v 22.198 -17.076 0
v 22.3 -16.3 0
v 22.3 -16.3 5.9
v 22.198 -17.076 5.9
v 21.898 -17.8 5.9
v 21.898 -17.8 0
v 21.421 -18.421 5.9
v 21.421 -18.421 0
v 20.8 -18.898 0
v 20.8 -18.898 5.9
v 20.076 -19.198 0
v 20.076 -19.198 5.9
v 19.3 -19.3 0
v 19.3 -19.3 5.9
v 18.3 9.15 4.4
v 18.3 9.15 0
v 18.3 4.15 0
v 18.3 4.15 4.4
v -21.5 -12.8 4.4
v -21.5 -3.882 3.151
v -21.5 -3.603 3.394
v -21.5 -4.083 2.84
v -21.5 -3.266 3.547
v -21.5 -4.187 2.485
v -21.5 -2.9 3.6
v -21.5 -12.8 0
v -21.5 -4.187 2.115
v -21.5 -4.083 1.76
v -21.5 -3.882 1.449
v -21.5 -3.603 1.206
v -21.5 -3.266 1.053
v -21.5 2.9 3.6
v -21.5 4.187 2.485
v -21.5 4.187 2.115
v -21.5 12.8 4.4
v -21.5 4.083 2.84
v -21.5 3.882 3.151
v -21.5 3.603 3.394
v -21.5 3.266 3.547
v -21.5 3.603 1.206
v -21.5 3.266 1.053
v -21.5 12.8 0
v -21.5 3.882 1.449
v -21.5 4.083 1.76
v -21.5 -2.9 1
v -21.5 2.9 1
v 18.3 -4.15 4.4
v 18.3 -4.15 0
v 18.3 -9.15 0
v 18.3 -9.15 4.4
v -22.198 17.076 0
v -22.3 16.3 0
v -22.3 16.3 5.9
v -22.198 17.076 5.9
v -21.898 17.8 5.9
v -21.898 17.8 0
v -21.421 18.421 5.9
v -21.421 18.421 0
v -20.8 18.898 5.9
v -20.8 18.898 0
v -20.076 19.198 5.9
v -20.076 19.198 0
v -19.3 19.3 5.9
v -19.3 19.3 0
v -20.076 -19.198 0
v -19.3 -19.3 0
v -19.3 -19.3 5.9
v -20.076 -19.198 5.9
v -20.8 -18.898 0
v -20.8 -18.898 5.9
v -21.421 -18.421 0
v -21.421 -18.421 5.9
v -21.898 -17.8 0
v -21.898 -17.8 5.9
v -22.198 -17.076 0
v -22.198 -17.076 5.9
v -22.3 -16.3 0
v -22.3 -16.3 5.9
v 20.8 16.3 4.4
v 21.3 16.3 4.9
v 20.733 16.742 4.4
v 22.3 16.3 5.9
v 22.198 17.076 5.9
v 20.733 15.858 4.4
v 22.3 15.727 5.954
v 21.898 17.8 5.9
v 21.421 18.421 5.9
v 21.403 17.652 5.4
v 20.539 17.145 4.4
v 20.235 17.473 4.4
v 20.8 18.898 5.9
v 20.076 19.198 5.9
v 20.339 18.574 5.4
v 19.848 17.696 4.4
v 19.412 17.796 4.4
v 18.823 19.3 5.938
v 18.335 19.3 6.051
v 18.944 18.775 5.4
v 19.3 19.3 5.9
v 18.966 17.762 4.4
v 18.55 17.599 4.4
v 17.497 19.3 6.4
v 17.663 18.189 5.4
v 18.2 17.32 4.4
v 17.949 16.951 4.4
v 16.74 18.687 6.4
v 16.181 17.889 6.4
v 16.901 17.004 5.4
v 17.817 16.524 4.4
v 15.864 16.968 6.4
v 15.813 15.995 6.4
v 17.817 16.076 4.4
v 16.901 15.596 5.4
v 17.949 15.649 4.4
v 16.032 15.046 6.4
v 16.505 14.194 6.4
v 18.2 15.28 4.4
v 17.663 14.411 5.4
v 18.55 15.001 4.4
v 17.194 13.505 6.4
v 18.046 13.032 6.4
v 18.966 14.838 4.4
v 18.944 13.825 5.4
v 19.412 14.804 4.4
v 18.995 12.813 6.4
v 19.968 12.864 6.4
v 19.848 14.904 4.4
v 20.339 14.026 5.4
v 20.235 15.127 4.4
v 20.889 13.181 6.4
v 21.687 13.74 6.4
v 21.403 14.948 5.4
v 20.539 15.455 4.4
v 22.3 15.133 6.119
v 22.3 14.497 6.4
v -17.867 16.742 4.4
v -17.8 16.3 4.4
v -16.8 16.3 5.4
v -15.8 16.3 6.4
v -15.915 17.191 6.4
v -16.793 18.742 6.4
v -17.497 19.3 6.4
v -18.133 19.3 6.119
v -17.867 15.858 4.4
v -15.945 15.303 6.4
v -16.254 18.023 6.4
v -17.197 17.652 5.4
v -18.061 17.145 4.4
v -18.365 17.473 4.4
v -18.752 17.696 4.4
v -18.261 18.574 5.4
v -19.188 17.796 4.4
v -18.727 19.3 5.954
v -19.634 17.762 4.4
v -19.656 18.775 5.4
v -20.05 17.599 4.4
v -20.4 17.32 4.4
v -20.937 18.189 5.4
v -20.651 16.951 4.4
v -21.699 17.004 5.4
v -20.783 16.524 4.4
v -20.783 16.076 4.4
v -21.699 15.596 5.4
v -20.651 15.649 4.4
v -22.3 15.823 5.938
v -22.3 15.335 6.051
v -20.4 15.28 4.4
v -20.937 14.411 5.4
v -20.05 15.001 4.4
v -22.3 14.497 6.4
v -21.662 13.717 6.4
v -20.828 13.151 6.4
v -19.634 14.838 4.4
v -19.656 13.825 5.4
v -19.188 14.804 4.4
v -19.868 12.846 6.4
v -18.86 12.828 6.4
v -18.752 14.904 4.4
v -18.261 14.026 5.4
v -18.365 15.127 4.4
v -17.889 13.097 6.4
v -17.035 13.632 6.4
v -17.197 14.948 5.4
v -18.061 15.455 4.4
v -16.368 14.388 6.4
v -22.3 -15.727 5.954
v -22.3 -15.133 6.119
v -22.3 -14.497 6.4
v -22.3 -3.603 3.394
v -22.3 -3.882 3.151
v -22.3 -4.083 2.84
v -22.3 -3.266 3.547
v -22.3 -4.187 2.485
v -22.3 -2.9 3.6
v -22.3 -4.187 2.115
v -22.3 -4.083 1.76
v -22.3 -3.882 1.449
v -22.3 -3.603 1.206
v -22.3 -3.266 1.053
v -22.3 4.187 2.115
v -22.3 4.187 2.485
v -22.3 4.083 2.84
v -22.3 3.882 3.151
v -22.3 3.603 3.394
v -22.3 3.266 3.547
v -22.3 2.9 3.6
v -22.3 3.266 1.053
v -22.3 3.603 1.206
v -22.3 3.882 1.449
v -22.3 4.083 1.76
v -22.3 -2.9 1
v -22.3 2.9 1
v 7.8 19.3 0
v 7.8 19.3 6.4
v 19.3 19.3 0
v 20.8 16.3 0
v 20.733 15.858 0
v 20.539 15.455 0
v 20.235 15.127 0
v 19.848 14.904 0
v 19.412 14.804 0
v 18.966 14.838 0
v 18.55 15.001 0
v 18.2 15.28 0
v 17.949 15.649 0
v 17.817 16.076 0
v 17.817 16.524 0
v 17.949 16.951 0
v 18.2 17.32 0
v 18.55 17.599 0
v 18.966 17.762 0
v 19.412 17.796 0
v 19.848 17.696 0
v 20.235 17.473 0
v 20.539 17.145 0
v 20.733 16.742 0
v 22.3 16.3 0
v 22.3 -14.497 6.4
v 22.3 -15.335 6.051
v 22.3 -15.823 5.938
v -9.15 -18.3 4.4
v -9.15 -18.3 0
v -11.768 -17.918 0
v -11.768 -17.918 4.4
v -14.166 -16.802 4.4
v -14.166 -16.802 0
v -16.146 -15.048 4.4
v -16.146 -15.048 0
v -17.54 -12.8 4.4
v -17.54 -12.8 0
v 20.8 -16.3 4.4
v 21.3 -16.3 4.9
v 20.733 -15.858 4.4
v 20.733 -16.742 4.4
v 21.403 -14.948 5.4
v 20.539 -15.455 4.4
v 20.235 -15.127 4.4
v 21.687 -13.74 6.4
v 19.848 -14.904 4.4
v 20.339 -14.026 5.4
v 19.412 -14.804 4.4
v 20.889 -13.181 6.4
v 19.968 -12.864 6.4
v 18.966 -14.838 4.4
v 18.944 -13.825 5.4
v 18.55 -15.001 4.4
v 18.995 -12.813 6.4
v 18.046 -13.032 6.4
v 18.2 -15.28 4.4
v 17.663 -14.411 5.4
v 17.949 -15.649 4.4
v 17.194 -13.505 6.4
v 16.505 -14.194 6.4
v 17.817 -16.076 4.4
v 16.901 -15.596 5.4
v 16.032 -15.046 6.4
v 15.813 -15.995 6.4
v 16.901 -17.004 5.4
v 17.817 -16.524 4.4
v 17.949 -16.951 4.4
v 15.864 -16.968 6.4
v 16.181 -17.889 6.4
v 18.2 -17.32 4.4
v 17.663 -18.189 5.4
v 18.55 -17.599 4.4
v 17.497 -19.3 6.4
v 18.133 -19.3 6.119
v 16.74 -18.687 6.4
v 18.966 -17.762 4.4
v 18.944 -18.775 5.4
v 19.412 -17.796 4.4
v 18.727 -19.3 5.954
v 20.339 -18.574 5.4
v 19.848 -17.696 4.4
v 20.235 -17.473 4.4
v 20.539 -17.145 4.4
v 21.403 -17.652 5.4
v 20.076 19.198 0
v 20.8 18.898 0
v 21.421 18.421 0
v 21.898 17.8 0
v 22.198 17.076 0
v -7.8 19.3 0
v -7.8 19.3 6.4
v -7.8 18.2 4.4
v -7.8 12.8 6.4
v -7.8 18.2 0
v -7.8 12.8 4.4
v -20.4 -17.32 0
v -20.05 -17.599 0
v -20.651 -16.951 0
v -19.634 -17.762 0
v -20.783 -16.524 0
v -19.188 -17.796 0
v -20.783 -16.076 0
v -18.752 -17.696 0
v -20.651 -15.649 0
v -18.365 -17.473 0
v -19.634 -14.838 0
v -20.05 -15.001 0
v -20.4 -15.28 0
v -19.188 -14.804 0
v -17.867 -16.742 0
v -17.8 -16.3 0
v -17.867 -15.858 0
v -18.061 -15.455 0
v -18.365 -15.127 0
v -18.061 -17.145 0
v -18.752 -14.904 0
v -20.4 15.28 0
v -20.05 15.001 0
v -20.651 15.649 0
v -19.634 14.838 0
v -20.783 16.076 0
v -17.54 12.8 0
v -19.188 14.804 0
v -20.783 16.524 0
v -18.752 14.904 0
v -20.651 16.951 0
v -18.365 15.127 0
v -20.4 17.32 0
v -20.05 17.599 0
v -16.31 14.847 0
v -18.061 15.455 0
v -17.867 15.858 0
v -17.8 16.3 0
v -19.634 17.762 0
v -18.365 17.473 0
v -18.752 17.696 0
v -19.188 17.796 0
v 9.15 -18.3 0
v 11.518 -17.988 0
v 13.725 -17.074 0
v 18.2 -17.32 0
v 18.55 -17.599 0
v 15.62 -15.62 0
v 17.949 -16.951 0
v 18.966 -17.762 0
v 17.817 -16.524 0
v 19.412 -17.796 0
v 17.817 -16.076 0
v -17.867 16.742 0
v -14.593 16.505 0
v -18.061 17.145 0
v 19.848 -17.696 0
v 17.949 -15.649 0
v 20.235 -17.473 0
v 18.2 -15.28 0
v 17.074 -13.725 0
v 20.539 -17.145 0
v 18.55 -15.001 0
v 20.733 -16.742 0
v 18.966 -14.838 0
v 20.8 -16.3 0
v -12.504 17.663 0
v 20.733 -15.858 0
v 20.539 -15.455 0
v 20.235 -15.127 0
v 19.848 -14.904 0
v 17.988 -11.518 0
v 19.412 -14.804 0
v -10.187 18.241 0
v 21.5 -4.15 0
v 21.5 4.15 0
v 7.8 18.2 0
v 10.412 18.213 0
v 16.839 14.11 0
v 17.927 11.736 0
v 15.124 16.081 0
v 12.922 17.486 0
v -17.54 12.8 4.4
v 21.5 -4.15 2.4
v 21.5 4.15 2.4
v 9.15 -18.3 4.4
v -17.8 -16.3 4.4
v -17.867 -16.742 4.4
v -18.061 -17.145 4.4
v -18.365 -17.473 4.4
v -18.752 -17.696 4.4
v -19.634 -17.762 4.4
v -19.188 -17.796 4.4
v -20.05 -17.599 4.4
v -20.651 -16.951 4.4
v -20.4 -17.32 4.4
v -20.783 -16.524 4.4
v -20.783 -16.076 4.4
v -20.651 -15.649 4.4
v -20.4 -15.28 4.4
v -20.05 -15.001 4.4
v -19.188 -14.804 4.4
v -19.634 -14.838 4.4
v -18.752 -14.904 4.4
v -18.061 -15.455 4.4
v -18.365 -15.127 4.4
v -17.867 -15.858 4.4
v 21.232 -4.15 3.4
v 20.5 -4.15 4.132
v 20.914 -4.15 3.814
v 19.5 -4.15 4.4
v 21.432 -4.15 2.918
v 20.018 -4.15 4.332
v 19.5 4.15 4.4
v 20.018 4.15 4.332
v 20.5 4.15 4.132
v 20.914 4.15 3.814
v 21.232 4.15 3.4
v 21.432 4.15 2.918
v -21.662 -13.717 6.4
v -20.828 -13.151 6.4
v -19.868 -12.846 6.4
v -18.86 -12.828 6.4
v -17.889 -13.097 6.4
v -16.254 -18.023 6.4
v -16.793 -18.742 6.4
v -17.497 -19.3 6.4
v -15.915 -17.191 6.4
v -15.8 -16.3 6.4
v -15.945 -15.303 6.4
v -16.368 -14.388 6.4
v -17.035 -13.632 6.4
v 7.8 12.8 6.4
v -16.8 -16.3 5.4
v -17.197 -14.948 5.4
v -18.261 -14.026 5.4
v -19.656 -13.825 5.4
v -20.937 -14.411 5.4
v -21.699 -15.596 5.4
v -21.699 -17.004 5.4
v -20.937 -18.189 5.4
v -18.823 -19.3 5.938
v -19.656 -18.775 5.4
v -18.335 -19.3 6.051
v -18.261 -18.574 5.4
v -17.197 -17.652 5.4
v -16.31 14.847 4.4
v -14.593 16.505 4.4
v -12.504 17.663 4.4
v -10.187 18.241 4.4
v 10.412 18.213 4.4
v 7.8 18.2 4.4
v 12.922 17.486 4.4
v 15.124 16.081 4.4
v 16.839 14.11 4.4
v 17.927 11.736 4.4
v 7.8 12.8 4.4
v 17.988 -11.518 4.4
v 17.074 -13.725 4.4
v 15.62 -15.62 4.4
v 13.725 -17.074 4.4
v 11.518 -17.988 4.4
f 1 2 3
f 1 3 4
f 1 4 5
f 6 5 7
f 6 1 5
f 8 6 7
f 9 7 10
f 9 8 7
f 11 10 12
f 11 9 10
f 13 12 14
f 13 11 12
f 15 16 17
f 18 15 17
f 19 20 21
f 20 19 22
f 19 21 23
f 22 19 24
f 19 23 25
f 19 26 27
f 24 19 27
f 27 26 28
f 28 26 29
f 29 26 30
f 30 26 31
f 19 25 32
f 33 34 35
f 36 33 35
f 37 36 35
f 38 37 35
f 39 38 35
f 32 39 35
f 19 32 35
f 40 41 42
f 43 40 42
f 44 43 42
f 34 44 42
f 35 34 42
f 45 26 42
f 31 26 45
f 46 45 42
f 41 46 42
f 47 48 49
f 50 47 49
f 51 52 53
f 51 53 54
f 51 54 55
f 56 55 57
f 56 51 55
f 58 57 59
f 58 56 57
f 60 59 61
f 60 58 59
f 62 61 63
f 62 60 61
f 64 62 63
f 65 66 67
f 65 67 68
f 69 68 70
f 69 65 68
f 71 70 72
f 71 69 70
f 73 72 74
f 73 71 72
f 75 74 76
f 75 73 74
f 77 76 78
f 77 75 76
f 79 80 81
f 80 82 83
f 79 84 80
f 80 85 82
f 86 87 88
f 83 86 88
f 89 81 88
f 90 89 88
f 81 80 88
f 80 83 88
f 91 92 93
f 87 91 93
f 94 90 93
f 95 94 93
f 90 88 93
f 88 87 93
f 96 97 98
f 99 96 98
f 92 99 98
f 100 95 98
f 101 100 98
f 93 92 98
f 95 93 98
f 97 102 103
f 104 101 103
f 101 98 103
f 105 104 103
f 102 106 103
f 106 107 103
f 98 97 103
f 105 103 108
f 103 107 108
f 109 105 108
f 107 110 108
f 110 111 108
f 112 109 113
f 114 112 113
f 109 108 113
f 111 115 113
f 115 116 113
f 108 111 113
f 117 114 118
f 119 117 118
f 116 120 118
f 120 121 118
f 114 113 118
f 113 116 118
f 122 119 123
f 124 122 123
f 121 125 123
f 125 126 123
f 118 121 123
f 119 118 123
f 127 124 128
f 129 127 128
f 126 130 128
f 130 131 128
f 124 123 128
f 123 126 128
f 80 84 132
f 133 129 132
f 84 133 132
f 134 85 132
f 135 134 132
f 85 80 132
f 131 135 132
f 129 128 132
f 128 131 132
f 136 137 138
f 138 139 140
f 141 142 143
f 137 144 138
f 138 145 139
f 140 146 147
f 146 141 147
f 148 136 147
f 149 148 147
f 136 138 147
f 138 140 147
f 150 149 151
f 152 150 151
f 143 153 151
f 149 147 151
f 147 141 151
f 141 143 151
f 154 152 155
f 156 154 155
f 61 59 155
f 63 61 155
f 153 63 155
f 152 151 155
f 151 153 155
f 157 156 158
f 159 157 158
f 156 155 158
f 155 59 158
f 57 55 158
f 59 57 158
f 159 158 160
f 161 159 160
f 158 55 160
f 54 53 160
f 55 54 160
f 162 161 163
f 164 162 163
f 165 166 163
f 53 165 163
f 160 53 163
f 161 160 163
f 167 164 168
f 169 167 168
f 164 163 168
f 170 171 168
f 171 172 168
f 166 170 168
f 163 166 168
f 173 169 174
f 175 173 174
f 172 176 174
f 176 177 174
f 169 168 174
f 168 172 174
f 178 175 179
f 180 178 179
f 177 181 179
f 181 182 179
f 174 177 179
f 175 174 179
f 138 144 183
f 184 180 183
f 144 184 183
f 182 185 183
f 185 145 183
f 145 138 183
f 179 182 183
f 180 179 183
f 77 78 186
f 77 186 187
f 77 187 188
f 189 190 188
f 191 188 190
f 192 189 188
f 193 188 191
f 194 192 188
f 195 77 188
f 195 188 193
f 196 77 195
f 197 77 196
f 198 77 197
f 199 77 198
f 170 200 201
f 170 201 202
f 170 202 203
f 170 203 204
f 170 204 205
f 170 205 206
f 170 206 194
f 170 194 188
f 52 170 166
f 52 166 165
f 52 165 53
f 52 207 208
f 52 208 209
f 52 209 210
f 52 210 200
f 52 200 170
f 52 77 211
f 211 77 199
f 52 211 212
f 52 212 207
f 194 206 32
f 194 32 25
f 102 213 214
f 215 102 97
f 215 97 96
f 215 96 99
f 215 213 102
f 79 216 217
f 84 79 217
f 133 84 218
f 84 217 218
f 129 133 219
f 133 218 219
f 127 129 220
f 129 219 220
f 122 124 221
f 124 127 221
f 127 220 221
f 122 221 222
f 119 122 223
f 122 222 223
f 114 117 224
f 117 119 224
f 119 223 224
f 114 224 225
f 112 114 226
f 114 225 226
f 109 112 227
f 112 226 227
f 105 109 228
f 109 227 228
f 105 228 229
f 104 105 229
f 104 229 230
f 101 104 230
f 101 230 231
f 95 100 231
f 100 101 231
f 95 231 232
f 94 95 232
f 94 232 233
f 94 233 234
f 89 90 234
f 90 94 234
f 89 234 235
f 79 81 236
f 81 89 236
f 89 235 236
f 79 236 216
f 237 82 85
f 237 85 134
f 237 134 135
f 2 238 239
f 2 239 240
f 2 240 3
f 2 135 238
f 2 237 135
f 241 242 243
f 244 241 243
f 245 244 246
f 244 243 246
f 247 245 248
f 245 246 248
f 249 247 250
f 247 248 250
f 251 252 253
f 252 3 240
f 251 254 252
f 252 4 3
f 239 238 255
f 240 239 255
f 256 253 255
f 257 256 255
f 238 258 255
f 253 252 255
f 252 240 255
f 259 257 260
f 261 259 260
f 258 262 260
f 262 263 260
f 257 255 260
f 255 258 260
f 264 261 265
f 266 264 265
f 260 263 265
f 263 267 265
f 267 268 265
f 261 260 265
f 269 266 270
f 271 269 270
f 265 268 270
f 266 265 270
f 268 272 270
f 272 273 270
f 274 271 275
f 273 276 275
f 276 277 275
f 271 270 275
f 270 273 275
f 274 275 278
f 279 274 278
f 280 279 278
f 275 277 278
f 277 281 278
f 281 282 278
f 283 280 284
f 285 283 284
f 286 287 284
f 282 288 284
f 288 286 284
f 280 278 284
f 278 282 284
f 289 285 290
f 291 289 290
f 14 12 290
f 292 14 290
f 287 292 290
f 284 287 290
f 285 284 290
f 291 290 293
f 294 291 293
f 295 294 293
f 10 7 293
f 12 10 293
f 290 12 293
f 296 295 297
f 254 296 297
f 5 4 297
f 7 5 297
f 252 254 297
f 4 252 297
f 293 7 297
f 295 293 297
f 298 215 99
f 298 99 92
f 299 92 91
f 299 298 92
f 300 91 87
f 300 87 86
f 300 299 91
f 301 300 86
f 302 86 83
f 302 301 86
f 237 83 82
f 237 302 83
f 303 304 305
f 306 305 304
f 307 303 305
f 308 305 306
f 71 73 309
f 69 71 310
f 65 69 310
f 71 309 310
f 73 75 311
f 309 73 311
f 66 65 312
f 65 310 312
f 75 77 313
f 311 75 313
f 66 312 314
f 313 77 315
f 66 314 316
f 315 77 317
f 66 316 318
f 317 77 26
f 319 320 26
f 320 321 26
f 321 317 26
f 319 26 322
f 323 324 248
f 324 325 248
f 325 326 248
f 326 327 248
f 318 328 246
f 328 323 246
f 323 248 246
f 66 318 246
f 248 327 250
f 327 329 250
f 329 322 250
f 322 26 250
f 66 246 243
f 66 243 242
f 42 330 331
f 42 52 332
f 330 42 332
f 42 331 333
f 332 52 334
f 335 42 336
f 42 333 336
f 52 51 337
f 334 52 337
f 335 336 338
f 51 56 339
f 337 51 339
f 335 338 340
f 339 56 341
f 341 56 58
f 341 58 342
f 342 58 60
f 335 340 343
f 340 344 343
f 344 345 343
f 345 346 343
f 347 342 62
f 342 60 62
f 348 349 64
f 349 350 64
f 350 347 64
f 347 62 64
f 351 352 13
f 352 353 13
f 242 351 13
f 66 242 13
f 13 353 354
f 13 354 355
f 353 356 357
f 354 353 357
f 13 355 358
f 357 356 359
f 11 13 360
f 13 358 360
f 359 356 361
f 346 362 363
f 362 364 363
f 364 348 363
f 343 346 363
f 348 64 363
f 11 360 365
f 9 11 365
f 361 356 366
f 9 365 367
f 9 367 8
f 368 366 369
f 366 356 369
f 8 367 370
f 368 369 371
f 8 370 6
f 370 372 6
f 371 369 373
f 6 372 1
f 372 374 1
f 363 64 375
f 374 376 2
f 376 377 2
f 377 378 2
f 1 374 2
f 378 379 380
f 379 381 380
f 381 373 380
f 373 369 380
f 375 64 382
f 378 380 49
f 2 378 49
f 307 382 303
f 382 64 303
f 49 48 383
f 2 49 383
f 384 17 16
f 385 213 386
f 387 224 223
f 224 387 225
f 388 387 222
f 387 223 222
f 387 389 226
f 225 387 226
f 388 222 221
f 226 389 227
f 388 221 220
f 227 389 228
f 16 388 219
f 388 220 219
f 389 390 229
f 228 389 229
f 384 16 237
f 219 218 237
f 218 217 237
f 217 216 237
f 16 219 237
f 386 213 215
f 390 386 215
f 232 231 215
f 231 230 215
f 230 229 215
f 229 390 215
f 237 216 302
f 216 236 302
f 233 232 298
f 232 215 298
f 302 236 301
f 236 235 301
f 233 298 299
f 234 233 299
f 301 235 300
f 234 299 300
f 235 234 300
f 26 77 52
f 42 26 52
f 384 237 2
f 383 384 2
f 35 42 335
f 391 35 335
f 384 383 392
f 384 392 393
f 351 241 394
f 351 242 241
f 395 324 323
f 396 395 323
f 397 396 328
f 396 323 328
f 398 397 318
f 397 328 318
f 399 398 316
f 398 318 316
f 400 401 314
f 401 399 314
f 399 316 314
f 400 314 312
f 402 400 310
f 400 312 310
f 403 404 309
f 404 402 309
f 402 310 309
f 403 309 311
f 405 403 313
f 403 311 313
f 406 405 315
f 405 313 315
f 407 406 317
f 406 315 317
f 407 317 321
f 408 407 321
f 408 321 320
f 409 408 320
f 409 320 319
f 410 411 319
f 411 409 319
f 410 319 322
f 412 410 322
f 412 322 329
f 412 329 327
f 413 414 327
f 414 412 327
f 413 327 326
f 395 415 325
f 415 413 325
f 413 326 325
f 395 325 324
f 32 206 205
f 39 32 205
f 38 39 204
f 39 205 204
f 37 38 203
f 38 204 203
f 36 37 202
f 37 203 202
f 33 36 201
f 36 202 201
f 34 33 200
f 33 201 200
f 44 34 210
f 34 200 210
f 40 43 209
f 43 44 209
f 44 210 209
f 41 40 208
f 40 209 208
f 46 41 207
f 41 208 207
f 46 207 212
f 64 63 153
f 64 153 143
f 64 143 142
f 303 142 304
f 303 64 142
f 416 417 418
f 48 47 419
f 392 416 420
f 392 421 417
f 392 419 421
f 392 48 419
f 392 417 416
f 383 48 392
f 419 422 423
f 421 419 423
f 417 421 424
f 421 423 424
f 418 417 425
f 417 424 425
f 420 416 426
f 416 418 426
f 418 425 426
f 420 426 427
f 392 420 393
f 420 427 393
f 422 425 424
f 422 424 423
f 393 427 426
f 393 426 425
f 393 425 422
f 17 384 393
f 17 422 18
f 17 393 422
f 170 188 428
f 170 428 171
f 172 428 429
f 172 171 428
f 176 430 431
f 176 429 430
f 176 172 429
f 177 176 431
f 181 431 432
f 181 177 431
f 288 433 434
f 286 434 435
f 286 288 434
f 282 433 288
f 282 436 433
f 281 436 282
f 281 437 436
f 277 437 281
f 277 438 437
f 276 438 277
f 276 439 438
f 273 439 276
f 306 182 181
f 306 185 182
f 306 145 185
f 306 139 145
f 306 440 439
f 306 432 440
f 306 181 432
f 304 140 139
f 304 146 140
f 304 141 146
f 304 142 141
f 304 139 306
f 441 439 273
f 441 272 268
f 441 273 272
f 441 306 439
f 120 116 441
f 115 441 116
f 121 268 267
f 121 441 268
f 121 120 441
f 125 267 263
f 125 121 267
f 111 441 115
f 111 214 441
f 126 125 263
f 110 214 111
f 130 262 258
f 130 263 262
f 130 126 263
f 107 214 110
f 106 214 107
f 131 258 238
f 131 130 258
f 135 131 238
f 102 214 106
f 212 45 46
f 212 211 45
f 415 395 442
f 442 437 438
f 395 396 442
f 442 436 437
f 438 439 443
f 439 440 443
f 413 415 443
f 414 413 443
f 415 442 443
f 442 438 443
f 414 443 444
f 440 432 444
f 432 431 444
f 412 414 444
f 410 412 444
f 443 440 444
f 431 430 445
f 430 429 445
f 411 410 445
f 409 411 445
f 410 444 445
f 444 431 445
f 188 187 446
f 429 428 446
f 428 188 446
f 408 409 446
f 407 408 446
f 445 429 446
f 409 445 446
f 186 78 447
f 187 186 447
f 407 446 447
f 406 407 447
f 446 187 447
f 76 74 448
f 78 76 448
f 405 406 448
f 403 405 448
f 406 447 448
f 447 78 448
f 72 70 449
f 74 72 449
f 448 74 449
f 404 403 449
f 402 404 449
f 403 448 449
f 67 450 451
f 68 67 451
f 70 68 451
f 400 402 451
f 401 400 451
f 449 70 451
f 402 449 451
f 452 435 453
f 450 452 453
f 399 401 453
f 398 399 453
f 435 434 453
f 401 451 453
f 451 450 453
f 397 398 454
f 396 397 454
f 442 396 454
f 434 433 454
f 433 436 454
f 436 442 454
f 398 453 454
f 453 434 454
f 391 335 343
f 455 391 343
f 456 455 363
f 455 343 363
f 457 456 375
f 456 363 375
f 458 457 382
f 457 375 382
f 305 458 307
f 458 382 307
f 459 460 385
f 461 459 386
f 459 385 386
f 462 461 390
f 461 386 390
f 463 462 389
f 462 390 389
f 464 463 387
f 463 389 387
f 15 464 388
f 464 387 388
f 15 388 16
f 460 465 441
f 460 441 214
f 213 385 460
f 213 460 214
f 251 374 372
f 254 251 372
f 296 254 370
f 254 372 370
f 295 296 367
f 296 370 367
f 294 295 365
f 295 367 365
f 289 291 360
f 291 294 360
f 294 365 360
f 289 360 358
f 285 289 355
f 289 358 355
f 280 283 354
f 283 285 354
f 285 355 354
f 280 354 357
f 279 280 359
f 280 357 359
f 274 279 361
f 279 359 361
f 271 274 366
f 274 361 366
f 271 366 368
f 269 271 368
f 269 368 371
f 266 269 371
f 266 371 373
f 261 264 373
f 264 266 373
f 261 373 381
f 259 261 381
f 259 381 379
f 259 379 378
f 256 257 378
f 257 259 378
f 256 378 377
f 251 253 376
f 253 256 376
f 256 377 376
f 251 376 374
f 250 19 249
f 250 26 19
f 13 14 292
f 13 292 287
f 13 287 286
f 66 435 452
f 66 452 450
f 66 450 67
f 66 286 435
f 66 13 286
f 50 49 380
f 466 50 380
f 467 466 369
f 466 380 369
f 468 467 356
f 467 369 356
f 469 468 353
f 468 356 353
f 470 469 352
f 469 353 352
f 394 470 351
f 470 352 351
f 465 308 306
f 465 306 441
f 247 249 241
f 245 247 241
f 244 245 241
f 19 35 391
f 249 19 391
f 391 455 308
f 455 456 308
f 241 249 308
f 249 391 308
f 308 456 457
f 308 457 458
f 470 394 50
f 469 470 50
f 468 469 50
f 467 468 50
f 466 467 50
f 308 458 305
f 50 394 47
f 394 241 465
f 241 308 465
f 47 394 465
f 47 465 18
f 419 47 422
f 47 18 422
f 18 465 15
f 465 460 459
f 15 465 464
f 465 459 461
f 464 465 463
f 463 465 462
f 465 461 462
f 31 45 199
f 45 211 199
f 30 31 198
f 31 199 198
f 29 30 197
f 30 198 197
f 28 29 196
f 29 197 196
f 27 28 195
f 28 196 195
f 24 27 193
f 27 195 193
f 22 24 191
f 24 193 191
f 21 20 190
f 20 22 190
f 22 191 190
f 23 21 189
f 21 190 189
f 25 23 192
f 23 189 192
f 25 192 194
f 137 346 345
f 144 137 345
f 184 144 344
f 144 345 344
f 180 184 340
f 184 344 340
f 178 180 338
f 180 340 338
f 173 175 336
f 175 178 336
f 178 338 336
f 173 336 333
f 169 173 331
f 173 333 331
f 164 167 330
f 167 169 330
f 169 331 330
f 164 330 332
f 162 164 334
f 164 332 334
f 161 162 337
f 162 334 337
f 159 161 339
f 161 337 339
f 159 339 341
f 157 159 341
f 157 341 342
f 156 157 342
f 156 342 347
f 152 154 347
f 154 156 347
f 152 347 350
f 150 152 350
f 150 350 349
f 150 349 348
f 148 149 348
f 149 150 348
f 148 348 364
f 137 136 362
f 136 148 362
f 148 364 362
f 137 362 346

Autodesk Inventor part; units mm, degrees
ref_plane "YZ Plane" through (0, 0, 0) normal (1, 0, 0) x (0, 1, 0)
ref_plane "XZ Plane" through (0, 0, 0) normal (0, 1, 0) x (-1, 0, 0)
ref_plane "XY Plane" through (0, 0, 0) normal (0, 0, 1) x (1, 0, 0)
sketch "Эскиз1" plane through (0, 0, 0) normal (0, 0, 1) x (1, 0, 0)
  arc A0 (-22.3, -16.3) -> (-19.3, -19.3) centre (-19.3, -16.3) ccw
  line L0 (-22.3, -16.3) -> (-22.3, 16.3)
  arc A1 (-19.3, 19.3) -> (-22.3, 16.3) centre (-19.3, 16.3) ccw
  line L1 (-19.3, 19.3) -> (19.3, 19.3)
  arc A2 (22.3, 16.3) -> (19.3, 19.3) centre (19.3, 16.3) ccw
  line L2 (22.3, 16.3) -> (22.3, -16.3)
  arc A3 (19.3, -19.3) -> (22.3, -16.3) centre (19.3, -16.3) ccw
  line L3 (19.3, -19.3) -> (-19.3, -19.3)
  circle A4 centre (19.3, 16.3) radius 2 construction
  circle A5 centre (-19.3, 16.3) radius 2 construction
  circle A6 centre (-19.3, -16.3) radius 2 construction
  circle A7 centre (19.3, -16.3) radius 2 construction
  arc A8 (-1.4869, 14.15) -> (-14.15, 1.4869) centre (-9.15, 9.15) ccw
  line L4 (-14.15, 1.4869) -> (-14.15, -1.4869)
  arc A9 (-14.15, -1.4869) -> (-1.4869, -14.15) centre (-9.15, -9.15) ccw
  line L5 (-1.4869, -14.15) -> (1.4869, -14.15)
  arc A10 (1.4869, -14.15) -> (14.15, -1.4869) centre (9.15, -9.15) ccw
  line L6 (14.15, -1.4869) -> (14.15, 1.4869)
  arc A11 (14.15, 1.4869) -> (1.4869, 14.15) centre (9.15, 9.15) ccw
  line L7 (1.4869, 14.15) -> (-1.4869, 14.15)
  line L8 (-9.15, 9.15) -> (-9.15, 18.3) construction
  line L9 (9.15, 9.15) -> (9.15, 18.3) construction
  line L10 (-9.15, 9.15) -> (-18.3, 9.15) construction
  line L11 (-9.15, -9.15) -> (-18.3, -9.15) construction
  line L12 (-18.3, 9.15) -> (-18.3, -9.15)
  line L13 (-9.15, 18.3) -> (9.15, 18.3)
  line L14 (-22.3, 0) -> (22.3, 0) construction
  line L15 (0, 19.3) -> (0, -19.3) construction
  line L16 (18.3, 9.15) -> (18.3, -9.15)
  line L17 (-9.15, -18.3) -> (9.15, -18.3)
  circle A12 centre (-19.3, 16.3) radius 1.5
  circle A13 centre (19.3, 16.3) radius 1.5
  circle A14 centre (19.3, -16.3) radius 1.5
  circle A15 centre (-19.3, -16.3) radius 1.5
  line L18 (0, 19.3) -> (-7.8, 19.3) construction
  line L19 (-7.8, 19.3) -> (-7.8, 12.8) construction
  line L20 (-7.8, 12.8) -> (0, 12.8) construction
  line L21 (0, 12.8) -> (0, 19.3) construction
  line L22 (-7.8, 12.8) -> (7.8, 12.8)
  line L23 (7.8, 12.8) -> (7.8, 19.3)
  line L24 (7.8, 19.3) -> (-7.8, 19.3)
  line L25 (-7.8, 19.3) -> (-7.8, 12.8)
  line L26 (-18.3, 9.15) -> (-18.3, 4.15) construction
  line L27 (-18.3, -9.15) -> (-18.3, -4.15) construction
  line L28 (-18.3, -4.15) -> (-21.5, -4.15)
  line L29 (-21.5, -4.15) -> (-21.5, 4.15)
  line L30 (-21.5, 4.15) -> (-18.3, 4.15)
  line L31 (-18.3, 4.15) -> (-18.3, -4.15)
  line L32 (18.3, -4.15) -> (21.5, -4.15)
  line L33 (21.5, -4.15) -> (21.5, 4.15)
  line L34 (21.5, 4.15) -> (18.3, 4.15)
  line L35 (18.3, 4.15) -> (18.3, -4.15)
  line L36 (-21.5, 0) -> (-21.5, 12.8)
  line L37 (-21.5, 12.8) -> (-17.5405, 12.8)
  line L38 (-21.5, 0) -> (-21.5, -12.8)
  line L39 (-21.5, -12.8) -> (-17.5405, -12.8)
  point P0 (7.8, 18.1999)
  point P1 (-7.8, 18.1999)
  dimension "d5" = 3
  dimension "d6" = 3
  dimension "d7" = 3
  dimension "d8" = 3
  dimension "d9" = 7.8
  dimension "d10" = 6.5
  dimension "d11" = 15.6
  dimension "d12" = 6.5
  dimension "d13" = 5
  dimension "d14" = 5
  dimension "d15" = 3.2
  dimension "d16" = 8.3
  dimension "d19" = 12.8
extrude "Выдавливание1" add sketch "Эскиз1" along normal blind 6.4 contours L0 A1 L1 L25 L13 A8 L37 L36 L29 L38 L39 A9 L17 A10 L16 L32 L33 L34 A11 L23 A2 L2 A3 L3 A0 | L25 A8 L13 | L13 A11 L23 | A8 L25 L22 L23 A11 L6 A10 L5 A9 L4 | A8 L12 L30 L36 L37 | L16 A10 L6 A11 | A8 L4 A9 L12 | L34 L33 L32 L16 | L12 L28 L29 L30 | L12 A9 L39 L38 L28 | L17 A9 L5 A10
chamfer "Фаска1" distance 2 angle 45 4 edges at (17.8, 16.3, 6.4) (-20.8, 16.3, 6.4) (-20.8, -16.3, 6.4) (17.8, -16.3, 6.4)
extrude "Выдавливание2" cut sketch "Эскиз1" along normal blind 4.4 contours A8 L25 L22 L23 A11 L6 A10 L5 A9 L4 | A8 L12 L30 L36 L37 | L16 A10 L6 A11 | A8 L4 A9 L12 | L34 L33 L32 L16 | L12 L28 L29 L30 | L12 A9 L39 L38 L28 | L17 A9 L5 A10
sketch "Эскиз2" plane through (-22.3, -16.3, 0) normal (-1, 0, 0) x (0, 0, 1)
  line L0 (0, -3) -> (0, 0) projected
  line L1 (0, 35.6) -> (5.9, 35.6) projected
  line L2 (0, -3) -> (0, 35.6) construction
  line L3 (0, 16.3) -> (6.4, 16.3) construction
  line L4 (6.4, 30.7972) -> (6.4, 1.8028) projected
  line L5 (0, 16.3) -> (1, 16.3) construction
  line L6 (1, 16.3) -> (1, 20.5) construction
  line L7 (1, 20.5) -> (0, 20.5) construction
  line L8 (0, 20.5) -> (0, 16.3) construction
  line L9 (1, 20.5) -> (3.6, 20.5)
  line L10 (3.6, 20.5) -> (3.6, 12.1)
  line L11 (3.6, 12.1) -> (1, 12.1)
  line L12 (1, 12.1) -> (1, 20.5)
  line L13 (1, 20.5) -> (2.3, 20.5) construction
  line L14 (2.3, 20.5) -> (2.3, 19.2) construction
  line L15 (2.3, 19.2) -> (1, 19.2) construction
  line L16 (1, 19.2) -> (1, 20.5) construction
  arc A0 (3.6, 19.2) -> (1, 19.2) centre (2.3, 19.2) ccw
  arc A1 (1, 13.4) -> (3.6, 13.4) centre (2.3, 13.4) ccw
  point P0 (3.6, 13.4)
  point P1 (1, 19.2)
  point P2 (1, 13.4)
  point P3 (2.3, 12.1)
  point P4 (2.3, 20.5)
  dimension "d20" = 1
  dimension "d21" = 4.2
  dimension "d22" = 2.6
  dimension "d23" = 8.4
  dimension "d24" = 1.3
  dimension "d25" = 1.3
extrude "Выдавливание3" cut sketch "Эскиз2" against normal blind 0.8 contours A0 L10 A1 L12
fillet "Сопряжение1" radius 2 1 edges at (21.5, 0, 4.4)
properties part number "akkum_cap_pd"
